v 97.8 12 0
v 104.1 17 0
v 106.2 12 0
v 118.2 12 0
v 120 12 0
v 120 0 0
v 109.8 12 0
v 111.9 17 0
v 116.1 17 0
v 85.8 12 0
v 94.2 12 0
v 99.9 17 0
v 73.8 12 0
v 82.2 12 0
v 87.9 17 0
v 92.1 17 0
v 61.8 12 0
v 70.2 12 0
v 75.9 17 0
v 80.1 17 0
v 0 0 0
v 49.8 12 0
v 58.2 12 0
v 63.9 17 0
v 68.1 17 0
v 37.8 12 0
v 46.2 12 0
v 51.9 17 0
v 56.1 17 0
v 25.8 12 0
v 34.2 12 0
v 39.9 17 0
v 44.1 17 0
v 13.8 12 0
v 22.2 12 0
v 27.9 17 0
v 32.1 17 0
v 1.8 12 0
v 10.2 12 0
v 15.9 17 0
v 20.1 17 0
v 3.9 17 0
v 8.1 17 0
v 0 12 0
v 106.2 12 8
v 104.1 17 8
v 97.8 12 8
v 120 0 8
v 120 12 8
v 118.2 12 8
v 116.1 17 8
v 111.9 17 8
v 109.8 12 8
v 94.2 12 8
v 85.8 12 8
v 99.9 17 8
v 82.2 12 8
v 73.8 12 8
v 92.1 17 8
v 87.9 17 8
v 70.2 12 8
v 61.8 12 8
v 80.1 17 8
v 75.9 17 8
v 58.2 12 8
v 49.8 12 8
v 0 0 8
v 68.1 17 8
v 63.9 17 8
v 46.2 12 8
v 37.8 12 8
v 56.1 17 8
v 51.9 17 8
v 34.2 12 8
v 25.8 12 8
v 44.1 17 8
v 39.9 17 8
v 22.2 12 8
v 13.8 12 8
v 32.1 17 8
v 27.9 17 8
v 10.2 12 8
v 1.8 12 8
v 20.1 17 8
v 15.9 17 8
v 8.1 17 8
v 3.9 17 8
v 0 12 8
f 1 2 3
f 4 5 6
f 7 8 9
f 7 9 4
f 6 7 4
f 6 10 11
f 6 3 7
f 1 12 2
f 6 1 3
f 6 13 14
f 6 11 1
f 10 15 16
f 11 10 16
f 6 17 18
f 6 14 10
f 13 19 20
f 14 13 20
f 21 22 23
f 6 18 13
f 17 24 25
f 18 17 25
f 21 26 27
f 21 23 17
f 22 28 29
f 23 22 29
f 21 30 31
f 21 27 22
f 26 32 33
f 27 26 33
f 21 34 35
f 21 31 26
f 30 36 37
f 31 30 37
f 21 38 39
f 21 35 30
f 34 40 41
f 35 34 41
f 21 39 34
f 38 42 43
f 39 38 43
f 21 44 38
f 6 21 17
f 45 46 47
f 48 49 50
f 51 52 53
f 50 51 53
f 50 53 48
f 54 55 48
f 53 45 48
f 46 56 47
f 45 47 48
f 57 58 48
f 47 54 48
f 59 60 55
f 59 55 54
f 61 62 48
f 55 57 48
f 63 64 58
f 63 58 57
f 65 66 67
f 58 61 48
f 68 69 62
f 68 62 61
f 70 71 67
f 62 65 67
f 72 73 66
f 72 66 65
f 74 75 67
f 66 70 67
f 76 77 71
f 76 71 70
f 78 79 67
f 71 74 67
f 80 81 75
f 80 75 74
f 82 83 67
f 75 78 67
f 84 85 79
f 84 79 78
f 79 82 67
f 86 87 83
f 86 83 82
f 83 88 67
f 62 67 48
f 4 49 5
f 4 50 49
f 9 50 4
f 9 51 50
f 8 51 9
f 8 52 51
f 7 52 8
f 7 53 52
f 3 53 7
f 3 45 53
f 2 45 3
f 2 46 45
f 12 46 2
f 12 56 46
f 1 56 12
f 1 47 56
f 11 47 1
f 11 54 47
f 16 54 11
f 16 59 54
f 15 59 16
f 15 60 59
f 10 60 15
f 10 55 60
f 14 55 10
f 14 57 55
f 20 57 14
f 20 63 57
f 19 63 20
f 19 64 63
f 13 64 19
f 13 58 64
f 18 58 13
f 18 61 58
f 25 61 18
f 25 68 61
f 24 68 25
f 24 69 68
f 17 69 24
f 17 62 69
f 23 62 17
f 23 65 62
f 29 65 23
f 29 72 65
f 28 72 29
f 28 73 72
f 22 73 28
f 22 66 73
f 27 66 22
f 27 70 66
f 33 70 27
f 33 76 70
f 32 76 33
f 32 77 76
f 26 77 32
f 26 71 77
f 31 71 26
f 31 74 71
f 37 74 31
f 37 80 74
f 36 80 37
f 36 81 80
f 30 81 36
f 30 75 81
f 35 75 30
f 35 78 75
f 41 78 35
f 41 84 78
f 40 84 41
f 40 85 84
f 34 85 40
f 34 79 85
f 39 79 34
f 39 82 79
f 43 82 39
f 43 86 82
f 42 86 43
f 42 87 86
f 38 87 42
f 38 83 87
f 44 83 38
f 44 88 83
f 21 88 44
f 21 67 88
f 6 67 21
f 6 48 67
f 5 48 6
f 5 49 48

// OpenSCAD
$fn = 32;

// ----------------------------------------------------------------------
// Gear rack: 10 teeth, pitch 12 mm
// ----------------------------------------------------------------------

// --- parameters (mm) ---
teeth = 10;               // number of teeth
pitch = 12;               // tooth pitch, X
root_w = 8.4;             // tooth width at the root
tip_w = 4.2;              // tooth width at the tip
base_h = 12;              // rack body height, Y
tooth_h = 5;              // tooth height above the body
plate_t = 8;              // rack width, Z (extrusion height)

rack_l = teeth * pitch;  // overall length
total_h = base_h + tooth_h;  // overall height

profile = [[0, 0], [120, 0], [120, 12], [118.2, 12], [116.1, 17], [111.9, 17], [109.8, 12], [106.2, 12], [104.1, 17], [99.9, 17], [97.8, 12], [94.2, 12], [92.1, 17], [87.9, 17], [85.8, 12], [82.2, 12], [80.1, 17], [75.9, 17], [73.8, 12], [70.2, 12], [68.1, 17], [63.9, 17], [61.8, 12], [58.2, 12], [56.1, 17], [51.9, 17], [49.8, 12], [46.2, 12], [44.1, 17], [39.9, 17], [37.8, 12], [34.2, 12], [32.1, 17], [27.9, 17], [25.8, 12], [22.2, 12], [20.1, 17], [15.9, 17], [13.8, 12], [10.2, 12], [8.1, 17], [3.9, 17], [1.8, 12], [0, 12]];  // primary outline, 44 points, counter clockwise

// --- the one profile operation ---
linear_extrude(height = plate_t) polygon(points = profile);
